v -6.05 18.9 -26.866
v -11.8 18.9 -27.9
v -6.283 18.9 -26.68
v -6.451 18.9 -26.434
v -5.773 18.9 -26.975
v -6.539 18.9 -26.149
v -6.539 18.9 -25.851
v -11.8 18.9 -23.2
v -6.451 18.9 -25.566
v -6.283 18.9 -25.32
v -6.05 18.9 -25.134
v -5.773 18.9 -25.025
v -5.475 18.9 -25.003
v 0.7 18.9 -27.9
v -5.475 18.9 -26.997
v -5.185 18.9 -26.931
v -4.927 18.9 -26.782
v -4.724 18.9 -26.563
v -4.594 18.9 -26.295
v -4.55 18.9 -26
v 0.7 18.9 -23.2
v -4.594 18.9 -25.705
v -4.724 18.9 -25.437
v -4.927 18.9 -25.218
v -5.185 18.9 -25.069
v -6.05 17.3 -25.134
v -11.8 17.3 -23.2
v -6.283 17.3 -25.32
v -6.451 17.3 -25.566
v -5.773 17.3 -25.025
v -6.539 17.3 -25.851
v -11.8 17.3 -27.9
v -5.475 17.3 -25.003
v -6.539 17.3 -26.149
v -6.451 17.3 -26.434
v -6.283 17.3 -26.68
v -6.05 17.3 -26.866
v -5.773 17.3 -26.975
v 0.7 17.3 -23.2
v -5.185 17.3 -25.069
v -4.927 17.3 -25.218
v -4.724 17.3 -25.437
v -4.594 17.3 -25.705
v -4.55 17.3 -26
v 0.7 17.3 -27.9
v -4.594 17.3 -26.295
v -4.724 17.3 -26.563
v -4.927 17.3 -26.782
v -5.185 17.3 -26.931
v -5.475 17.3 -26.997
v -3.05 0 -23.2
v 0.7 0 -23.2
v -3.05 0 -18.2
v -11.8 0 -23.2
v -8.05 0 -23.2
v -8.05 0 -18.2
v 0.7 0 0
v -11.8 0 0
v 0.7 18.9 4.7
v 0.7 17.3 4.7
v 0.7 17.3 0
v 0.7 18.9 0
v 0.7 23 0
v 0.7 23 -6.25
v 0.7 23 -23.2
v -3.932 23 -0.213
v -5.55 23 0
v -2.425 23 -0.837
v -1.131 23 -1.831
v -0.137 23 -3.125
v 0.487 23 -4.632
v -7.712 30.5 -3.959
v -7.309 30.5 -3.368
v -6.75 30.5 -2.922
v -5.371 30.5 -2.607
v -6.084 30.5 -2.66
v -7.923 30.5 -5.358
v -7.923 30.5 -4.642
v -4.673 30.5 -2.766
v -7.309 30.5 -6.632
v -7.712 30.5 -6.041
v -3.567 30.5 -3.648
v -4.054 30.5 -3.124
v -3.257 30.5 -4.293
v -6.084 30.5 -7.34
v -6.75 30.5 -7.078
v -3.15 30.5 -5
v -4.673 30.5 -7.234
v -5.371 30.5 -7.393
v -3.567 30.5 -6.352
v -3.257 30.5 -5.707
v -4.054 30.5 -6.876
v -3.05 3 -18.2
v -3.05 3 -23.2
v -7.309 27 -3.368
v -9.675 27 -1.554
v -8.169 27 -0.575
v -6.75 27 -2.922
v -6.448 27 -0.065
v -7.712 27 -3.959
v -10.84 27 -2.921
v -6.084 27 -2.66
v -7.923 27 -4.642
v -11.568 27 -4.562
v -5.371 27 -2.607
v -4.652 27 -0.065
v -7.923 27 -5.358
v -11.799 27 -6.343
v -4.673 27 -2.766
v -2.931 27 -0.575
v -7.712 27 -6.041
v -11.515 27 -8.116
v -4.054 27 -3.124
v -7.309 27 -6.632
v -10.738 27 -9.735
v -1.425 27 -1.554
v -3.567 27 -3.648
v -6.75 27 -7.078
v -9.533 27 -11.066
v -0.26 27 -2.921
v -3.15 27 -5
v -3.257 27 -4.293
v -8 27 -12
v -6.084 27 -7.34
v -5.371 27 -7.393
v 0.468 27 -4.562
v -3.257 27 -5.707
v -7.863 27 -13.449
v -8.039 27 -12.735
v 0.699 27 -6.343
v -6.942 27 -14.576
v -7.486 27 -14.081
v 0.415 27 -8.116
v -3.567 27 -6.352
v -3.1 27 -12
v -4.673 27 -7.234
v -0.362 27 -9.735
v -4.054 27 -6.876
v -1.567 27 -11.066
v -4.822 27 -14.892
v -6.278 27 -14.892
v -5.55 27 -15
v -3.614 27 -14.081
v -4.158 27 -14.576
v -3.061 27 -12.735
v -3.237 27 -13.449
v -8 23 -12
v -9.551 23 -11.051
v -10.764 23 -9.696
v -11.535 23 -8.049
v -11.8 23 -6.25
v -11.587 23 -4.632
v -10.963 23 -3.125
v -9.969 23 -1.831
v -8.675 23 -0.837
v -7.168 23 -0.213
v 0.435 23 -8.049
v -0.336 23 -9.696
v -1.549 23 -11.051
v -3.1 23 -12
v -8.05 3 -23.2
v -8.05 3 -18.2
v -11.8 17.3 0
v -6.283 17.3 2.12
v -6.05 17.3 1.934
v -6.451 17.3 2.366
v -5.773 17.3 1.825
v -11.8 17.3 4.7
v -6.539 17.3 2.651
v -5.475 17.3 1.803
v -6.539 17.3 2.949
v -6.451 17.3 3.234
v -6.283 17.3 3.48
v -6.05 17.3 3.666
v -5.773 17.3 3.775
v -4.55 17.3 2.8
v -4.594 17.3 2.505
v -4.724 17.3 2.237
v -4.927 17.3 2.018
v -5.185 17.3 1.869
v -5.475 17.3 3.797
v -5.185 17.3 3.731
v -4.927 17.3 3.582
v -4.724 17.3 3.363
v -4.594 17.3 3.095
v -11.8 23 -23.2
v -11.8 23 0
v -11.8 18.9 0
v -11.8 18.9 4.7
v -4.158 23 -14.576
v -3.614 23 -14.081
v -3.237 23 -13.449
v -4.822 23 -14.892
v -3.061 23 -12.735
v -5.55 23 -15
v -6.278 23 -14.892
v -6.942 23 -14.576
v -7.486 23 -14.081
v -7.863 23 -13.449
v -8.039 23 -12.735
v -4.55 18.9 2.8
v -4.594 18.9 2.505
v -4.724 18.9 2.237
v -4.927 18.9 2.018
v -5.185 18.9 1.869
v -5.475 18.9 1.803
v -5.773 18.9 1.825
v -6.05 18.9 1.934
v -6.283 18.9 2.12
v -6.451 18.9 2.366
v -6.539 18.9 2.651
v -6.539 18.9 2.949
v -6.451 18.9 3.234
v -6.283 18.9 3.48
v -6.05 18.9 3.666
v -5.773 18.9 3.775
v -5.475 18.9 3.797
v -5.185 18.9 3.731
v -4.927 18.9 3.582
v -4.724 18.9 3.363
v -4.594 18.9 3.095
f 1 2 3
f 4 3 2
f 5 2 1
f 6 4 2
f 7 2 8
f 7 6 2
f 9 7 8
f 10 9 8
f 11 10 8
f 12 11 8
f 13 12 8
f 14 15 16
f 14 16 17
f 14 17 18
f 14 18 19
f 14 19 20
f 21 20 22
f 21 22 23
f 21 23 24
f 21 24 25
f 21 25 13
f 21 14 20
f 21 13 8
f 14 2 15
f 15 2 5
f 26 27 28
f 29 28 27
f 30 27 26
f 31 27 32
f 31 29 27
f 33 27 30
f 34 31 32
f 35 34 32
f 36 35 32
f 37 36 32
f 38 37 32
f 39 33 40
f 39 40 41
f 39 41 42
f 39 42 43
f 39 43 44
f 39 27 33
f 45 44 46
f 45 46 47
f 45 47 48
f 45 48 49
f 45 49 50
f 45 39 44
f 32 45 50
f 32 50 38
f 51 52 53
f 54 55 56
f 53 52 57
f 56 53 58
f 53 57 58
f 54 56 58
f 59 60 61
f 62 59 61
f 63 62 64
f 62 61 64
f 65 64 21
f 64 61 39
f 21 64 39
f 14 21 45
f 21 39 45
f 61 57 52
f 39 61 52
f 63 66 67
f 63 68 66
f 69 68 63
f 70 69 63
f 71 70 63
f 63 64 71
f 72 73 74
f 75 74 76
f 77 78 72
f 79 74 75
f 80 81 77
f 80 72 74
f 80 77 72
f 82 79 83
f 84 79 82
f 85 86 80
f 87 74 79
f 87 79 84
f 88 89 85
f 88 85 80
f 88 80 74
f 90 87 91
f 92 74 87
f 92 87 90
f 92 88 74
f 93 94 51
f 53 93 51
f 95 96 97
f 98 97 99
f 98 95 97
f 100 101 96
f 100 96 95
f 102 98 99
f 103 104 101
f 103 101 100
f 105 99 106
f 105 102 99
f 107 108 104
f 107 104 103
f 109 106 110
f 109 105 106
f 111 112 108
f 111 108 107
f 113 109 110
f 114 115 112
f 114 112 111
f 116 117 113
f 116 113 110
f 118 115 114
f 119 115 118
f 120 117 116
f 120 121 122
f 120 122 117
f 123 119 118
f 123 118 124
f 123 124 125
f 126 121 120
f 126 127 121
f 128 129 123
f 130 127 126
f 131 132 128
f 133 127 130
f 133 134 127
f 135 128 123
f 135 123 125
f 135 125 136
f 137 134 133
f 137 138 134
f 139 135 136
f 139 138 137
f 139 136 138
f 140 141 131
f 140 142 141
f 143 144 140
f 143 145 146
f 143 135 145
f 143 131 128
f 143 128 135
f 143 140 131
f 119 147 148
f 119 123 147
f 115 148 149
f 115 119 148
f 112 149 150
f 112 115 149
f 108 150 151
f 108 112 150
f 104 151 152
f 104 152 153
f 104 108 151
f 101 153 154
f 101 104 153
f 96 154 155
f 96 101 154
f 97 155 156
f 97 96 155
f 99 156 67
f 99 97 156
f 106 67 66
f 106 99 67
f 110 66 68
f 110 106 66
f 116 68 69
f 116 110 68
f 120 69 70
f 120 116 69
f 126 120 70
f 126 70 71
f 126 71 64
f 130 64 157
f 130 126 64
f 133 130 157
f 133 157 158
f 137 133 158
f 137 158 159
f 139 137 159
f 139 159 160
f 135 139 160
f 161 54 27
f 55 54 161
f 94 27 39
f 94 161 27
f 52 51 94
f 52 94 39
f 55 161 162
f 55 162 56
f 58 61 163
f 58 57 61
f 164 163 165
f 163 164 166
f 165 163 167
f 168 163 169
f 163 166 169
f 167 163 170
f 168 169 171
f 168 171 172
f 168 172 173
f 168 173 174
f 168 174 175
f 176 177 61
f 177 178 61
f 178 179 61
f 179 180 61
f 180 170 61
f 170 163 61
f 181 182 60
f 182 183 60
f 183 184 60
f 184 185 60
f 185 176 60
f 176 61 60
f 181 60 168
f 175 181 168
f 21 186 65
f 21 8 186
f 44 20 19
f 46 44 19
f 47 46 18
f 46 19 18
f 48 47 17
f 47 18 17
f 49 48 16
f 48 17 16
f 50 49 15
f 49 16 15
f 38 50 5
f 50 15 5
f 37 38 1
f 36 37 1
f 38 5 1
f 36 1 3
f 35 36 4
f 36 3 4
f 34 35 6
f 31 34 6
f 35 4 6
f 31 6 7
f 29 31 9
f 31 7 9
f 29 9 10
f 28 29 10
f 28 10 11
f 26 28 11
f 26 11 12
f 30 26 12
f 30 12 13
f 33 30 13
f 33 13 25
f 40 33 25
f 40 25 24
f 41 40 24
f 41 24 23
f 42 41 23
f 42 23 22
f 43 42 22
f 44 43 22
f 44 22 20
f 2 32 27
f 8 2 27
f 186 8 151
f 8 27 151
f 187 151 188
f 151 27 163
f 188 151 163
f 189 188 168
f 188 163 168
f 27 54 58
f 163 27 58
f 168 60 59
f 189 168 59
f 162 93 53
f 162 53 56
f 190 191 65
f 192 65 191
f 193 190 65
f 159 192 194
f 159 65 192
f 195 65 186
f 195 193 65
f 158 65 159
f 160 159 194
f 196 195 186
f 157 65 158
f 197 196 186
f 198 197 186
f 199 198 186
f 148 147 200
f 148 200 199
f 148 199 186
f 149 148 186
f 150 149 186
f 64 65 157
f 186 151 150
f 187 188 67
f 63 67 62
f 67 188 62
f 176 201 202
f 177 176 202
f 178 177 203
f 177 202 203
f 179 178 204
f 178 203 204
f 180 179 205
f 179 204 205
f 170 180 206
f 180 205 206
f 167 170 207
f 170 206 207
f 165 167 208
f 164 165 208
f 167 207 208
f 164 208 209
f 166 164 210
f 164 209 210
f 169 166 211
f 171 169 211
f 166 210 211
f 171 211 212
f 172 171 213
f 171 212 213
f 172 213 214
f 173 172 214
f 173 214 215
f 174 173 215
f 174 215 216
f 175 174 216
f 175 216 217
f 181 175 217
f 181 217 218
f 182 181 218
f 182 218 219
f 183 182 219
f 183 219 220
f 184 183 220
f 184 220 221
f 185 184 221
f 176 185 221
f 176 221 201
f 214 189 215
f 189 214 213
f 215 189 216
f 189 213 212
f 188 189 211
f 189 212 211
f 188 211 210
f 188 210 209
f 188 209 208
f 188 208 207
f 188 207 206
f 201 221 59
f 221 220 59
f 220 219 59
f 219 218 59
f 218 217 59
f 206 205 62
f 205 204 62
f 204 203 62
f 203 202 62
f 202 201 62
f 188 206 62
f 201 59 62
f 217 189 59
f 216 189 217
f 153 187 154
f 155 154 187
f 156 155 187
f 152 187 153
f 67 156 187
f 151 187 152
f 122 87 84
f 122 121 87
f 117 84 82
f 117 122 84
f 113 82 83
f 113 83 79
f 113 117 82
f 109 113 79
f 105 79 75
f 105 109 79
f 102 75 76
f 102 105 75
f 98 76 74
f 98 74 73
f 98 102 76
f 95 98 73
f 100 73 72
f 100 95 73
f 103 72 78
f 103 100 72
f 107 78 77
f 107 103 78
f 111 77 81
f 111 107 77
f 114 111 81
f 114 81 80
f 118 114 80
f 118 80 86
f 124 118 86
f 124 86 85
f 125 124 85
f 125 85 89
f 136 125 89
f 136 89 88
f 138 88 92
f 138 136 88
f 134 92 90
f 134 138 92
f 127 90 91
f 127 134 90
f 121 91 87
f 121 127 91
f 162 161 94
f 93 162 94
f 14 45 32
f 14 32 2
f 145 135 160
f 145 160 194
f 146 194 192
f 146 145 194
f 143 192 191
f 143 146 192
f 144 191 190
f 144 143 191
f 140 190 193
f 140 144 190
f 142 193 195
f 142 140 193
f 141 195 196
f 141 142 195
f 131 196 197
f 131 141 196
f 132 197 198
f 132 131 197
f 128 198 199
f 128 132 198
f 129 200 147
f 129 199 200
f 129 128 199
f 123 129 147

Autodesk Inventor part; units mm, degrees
ref_plane "YZ Plane" through (0, 0, 0) normal (1, 0, 0) x (0, 1, 0)
ref_plane "XZ Plane" through (0, 0, 0) normal (0, 1, 0) x (-1, 0, 0)
ref_plane "XY Plane" through (0, 0, 0) normal (0, 0, 1) x (1, 0, 0)
sketch "Boceto1" plane through (0, 0, 0) normal (0, 1, 0) x (-1, 0, 0)
  line L0 (0, 0) -> (11.8, 0)
  line L1 (11.8, 0) -> (11.8, -23.2)
  line L2 (11.8, -23.2) -> (0, -23.2)
  line L3 (0, -23.2) -> (0, 0)
  dimension "d0" = 11.8
  dimension "d1" = 23.2
extrude "Extrusión1" add sketch "Boceto1" along normal blind 23
sketch "Boceto2" plane through (0, 0, 0) normal (1, 0, 0) x (0, 0, -1)
  line L0 (0, 0) -> (0, 23) projected
  line L1 (0, 0) -> (0, 17.3)
  line L2 (0, 17.3) -> (-4.7, 17.3)
  line L3 (-4.7, 17.3) -> (-4.7, 18.9)
  line L4 (-4.7, 18.9) -> (0, 18.9)
  line L5 (23.2, 0) -> (23.2, 23) projected
  line L6 (23.2, 17.3) -> (27.9, 17.3)
  line L7 (27.9, 17.3) -> (27.9, 18.9)
  line L8 (27.9, 18.9) -> (23.2, 18.9)
  line L9 (0, 18.9) -> (0, 17.3)
  line L10 (23.2, 18.9) -> (23.2, 17.3)
  line L11 (0, 23) -> (23.2, 23) projected
  dimension "d4" = 17.3
  dimension "d5" = 4.7
  dimension "d6" = 1.6
  dimension "d7" = 4.7
  dimension "d35" = 4.1
  dimension "d36" = 23
extrude "Extrusión2" add sketch "Boceto2" against normal blind 11.8
move faces "Desplazar1" translate (0.7, 0, 0) faces at (0, 11.5333, -15.4667)
sketch "Boceto4" plane through (-11.8, 18.9, 4.7) normal (0, 1, 0) x (1, 0, 0)
  line L0 (12.5, 0) -> (12.5, 4.7) projected
  line L1 (0, 0) -> (12.5, 0)
  line L2 (12.5, 0) -> (0, 0) projected
  line L3 (6.25, 0) -> (6.25, 1.9)
  line L4 (0, 32.6) -> (0, 27.9) projected
  line L5 (12.5, 32.6) -> (0, 32.6) projected
  line L6 (0, 32.6) -> (12.5, 32.6)
  line L7 (6.25, 32.6) -> (6.25, 30.7)
  circle A0 centre (6.25, 1.9) radius 1
  circle A1 centre (6.25, 30.7) radius 1
  point P0 (11.8, 4.7)
  dimension "d13" = 1.9
  dimension "d14" = 1.9
  dimension "d15" = 2
  dimension "d16" = 2
extrude "Extrusión3" cut sketch "Boceto4" against normal blind 2.4
sketch "Boceto5" plane through (0, 23, 0) normal (0, 1, 0) x (1, 0, 0)
  line L0 (-11.8, 23.2) -> (-11.8, 0) projected
  line L1 (-11.8, 0) -> (0.7, 0) projected
  line L2 (-11.8, 0) -> (0.7, 0)
  line L3 (0.7, 0) -> (0.7, 15)
  line L4 (0.7, 0) -> (0.7, 23.2) projected
  line L5 (0.7, 15) -> (-11.8, 15)
  line L6 (-11.8, 15) -> (-11.8, 0)
  point P0 (0, 0)
  dimension "d19" = 15
extrude "Extrusión4" add sketch "Boceto5" along normal blind 4
sketch "Boceto6" plane through (0, 27, 0) normal (0, 1, 0) x (1, 0, 0)
  line L0 (-11.8, 0) -> (0.7, 0) projected
  line L1 (-5.55, 0) -> (-5.55, 5)
  circle A0 centre (-5.55, 5) radius 2.4
  point P0 (0, 0)
  dimension "d22" = 5
  dimension "d23" = 4.8
extrude "Extrusión5" add sketch "Boceto6" along normal blind 3.5
sketch "Boceto7" plane through (0, 27, 0) normal (0, 1, 0) x (1, 0, 0)
  line L0 (-11.8, 0) -> (0.7, 0) projected
  line L1 (-5.55, 0) -> (-5.55, 6.25)
  arc A0 (-7.9995, 12) -> (-3.1005, 12) centre (-5.55, 6.25) ccw
  line L2 (0.7, 15) -> (-11.8, 15) projected
  arc A1 (-3.1005, 12) -> (-7.9995, 12) centre (-5.55, 12.5) ccw
  line L3 (0.7, 0) -> (-11.8, 0)
  line L4 (-11.8, 15) -> (-11.8, 0) projected
  line L5 (-11.8, 0) -> (-11.8, 15)
  line L6 (-11.8, 15) -> (0.7, 15)
  line L7 (0.7, 23.2) -> (0.7, 0) projected
  line L8 (0.7, 0) -> (0.7, 15)
  point P0 (0, 0)
  dimension "d26" = 6.25
extrude "Extrusión6" cut sketch "Boceto7" against normal up to surface (4 mm away) contours L4 A0 L0 | A0 L7 L0 | L4 L2 A1 A0 | A0 A1 L2 L7
sketch "Boceto8" plane through (-11.8, 0, -23.2) normal (0, 0, -1) x (-1, 0, 0)
  line L0 (-12.5, 0) -> (0, 0) projected
  line L1 (-12.5, 0) -> (0, 0)
  line L2 (-6.25, 0) -> (-6.25, 3)
  line L3 (-6.25, 3) -> (-8.75, 3)
  line L4 (-8.75, 3) -> (-8.75, 0)
  line L5 (-6.25, 3) -> (-3.75, 3)
  line L6 (-3.75, 3) -> (-3.75, 0)
  point P0 (-11.8, 0)
  dimension "d30" = 3
  dimension "d31" = 2.5
  dimension "d32" = 2.5
extrude "Extrusión7" cut sketch "Boceto8" against normal blind 5
properties part number "microservo_FT"
